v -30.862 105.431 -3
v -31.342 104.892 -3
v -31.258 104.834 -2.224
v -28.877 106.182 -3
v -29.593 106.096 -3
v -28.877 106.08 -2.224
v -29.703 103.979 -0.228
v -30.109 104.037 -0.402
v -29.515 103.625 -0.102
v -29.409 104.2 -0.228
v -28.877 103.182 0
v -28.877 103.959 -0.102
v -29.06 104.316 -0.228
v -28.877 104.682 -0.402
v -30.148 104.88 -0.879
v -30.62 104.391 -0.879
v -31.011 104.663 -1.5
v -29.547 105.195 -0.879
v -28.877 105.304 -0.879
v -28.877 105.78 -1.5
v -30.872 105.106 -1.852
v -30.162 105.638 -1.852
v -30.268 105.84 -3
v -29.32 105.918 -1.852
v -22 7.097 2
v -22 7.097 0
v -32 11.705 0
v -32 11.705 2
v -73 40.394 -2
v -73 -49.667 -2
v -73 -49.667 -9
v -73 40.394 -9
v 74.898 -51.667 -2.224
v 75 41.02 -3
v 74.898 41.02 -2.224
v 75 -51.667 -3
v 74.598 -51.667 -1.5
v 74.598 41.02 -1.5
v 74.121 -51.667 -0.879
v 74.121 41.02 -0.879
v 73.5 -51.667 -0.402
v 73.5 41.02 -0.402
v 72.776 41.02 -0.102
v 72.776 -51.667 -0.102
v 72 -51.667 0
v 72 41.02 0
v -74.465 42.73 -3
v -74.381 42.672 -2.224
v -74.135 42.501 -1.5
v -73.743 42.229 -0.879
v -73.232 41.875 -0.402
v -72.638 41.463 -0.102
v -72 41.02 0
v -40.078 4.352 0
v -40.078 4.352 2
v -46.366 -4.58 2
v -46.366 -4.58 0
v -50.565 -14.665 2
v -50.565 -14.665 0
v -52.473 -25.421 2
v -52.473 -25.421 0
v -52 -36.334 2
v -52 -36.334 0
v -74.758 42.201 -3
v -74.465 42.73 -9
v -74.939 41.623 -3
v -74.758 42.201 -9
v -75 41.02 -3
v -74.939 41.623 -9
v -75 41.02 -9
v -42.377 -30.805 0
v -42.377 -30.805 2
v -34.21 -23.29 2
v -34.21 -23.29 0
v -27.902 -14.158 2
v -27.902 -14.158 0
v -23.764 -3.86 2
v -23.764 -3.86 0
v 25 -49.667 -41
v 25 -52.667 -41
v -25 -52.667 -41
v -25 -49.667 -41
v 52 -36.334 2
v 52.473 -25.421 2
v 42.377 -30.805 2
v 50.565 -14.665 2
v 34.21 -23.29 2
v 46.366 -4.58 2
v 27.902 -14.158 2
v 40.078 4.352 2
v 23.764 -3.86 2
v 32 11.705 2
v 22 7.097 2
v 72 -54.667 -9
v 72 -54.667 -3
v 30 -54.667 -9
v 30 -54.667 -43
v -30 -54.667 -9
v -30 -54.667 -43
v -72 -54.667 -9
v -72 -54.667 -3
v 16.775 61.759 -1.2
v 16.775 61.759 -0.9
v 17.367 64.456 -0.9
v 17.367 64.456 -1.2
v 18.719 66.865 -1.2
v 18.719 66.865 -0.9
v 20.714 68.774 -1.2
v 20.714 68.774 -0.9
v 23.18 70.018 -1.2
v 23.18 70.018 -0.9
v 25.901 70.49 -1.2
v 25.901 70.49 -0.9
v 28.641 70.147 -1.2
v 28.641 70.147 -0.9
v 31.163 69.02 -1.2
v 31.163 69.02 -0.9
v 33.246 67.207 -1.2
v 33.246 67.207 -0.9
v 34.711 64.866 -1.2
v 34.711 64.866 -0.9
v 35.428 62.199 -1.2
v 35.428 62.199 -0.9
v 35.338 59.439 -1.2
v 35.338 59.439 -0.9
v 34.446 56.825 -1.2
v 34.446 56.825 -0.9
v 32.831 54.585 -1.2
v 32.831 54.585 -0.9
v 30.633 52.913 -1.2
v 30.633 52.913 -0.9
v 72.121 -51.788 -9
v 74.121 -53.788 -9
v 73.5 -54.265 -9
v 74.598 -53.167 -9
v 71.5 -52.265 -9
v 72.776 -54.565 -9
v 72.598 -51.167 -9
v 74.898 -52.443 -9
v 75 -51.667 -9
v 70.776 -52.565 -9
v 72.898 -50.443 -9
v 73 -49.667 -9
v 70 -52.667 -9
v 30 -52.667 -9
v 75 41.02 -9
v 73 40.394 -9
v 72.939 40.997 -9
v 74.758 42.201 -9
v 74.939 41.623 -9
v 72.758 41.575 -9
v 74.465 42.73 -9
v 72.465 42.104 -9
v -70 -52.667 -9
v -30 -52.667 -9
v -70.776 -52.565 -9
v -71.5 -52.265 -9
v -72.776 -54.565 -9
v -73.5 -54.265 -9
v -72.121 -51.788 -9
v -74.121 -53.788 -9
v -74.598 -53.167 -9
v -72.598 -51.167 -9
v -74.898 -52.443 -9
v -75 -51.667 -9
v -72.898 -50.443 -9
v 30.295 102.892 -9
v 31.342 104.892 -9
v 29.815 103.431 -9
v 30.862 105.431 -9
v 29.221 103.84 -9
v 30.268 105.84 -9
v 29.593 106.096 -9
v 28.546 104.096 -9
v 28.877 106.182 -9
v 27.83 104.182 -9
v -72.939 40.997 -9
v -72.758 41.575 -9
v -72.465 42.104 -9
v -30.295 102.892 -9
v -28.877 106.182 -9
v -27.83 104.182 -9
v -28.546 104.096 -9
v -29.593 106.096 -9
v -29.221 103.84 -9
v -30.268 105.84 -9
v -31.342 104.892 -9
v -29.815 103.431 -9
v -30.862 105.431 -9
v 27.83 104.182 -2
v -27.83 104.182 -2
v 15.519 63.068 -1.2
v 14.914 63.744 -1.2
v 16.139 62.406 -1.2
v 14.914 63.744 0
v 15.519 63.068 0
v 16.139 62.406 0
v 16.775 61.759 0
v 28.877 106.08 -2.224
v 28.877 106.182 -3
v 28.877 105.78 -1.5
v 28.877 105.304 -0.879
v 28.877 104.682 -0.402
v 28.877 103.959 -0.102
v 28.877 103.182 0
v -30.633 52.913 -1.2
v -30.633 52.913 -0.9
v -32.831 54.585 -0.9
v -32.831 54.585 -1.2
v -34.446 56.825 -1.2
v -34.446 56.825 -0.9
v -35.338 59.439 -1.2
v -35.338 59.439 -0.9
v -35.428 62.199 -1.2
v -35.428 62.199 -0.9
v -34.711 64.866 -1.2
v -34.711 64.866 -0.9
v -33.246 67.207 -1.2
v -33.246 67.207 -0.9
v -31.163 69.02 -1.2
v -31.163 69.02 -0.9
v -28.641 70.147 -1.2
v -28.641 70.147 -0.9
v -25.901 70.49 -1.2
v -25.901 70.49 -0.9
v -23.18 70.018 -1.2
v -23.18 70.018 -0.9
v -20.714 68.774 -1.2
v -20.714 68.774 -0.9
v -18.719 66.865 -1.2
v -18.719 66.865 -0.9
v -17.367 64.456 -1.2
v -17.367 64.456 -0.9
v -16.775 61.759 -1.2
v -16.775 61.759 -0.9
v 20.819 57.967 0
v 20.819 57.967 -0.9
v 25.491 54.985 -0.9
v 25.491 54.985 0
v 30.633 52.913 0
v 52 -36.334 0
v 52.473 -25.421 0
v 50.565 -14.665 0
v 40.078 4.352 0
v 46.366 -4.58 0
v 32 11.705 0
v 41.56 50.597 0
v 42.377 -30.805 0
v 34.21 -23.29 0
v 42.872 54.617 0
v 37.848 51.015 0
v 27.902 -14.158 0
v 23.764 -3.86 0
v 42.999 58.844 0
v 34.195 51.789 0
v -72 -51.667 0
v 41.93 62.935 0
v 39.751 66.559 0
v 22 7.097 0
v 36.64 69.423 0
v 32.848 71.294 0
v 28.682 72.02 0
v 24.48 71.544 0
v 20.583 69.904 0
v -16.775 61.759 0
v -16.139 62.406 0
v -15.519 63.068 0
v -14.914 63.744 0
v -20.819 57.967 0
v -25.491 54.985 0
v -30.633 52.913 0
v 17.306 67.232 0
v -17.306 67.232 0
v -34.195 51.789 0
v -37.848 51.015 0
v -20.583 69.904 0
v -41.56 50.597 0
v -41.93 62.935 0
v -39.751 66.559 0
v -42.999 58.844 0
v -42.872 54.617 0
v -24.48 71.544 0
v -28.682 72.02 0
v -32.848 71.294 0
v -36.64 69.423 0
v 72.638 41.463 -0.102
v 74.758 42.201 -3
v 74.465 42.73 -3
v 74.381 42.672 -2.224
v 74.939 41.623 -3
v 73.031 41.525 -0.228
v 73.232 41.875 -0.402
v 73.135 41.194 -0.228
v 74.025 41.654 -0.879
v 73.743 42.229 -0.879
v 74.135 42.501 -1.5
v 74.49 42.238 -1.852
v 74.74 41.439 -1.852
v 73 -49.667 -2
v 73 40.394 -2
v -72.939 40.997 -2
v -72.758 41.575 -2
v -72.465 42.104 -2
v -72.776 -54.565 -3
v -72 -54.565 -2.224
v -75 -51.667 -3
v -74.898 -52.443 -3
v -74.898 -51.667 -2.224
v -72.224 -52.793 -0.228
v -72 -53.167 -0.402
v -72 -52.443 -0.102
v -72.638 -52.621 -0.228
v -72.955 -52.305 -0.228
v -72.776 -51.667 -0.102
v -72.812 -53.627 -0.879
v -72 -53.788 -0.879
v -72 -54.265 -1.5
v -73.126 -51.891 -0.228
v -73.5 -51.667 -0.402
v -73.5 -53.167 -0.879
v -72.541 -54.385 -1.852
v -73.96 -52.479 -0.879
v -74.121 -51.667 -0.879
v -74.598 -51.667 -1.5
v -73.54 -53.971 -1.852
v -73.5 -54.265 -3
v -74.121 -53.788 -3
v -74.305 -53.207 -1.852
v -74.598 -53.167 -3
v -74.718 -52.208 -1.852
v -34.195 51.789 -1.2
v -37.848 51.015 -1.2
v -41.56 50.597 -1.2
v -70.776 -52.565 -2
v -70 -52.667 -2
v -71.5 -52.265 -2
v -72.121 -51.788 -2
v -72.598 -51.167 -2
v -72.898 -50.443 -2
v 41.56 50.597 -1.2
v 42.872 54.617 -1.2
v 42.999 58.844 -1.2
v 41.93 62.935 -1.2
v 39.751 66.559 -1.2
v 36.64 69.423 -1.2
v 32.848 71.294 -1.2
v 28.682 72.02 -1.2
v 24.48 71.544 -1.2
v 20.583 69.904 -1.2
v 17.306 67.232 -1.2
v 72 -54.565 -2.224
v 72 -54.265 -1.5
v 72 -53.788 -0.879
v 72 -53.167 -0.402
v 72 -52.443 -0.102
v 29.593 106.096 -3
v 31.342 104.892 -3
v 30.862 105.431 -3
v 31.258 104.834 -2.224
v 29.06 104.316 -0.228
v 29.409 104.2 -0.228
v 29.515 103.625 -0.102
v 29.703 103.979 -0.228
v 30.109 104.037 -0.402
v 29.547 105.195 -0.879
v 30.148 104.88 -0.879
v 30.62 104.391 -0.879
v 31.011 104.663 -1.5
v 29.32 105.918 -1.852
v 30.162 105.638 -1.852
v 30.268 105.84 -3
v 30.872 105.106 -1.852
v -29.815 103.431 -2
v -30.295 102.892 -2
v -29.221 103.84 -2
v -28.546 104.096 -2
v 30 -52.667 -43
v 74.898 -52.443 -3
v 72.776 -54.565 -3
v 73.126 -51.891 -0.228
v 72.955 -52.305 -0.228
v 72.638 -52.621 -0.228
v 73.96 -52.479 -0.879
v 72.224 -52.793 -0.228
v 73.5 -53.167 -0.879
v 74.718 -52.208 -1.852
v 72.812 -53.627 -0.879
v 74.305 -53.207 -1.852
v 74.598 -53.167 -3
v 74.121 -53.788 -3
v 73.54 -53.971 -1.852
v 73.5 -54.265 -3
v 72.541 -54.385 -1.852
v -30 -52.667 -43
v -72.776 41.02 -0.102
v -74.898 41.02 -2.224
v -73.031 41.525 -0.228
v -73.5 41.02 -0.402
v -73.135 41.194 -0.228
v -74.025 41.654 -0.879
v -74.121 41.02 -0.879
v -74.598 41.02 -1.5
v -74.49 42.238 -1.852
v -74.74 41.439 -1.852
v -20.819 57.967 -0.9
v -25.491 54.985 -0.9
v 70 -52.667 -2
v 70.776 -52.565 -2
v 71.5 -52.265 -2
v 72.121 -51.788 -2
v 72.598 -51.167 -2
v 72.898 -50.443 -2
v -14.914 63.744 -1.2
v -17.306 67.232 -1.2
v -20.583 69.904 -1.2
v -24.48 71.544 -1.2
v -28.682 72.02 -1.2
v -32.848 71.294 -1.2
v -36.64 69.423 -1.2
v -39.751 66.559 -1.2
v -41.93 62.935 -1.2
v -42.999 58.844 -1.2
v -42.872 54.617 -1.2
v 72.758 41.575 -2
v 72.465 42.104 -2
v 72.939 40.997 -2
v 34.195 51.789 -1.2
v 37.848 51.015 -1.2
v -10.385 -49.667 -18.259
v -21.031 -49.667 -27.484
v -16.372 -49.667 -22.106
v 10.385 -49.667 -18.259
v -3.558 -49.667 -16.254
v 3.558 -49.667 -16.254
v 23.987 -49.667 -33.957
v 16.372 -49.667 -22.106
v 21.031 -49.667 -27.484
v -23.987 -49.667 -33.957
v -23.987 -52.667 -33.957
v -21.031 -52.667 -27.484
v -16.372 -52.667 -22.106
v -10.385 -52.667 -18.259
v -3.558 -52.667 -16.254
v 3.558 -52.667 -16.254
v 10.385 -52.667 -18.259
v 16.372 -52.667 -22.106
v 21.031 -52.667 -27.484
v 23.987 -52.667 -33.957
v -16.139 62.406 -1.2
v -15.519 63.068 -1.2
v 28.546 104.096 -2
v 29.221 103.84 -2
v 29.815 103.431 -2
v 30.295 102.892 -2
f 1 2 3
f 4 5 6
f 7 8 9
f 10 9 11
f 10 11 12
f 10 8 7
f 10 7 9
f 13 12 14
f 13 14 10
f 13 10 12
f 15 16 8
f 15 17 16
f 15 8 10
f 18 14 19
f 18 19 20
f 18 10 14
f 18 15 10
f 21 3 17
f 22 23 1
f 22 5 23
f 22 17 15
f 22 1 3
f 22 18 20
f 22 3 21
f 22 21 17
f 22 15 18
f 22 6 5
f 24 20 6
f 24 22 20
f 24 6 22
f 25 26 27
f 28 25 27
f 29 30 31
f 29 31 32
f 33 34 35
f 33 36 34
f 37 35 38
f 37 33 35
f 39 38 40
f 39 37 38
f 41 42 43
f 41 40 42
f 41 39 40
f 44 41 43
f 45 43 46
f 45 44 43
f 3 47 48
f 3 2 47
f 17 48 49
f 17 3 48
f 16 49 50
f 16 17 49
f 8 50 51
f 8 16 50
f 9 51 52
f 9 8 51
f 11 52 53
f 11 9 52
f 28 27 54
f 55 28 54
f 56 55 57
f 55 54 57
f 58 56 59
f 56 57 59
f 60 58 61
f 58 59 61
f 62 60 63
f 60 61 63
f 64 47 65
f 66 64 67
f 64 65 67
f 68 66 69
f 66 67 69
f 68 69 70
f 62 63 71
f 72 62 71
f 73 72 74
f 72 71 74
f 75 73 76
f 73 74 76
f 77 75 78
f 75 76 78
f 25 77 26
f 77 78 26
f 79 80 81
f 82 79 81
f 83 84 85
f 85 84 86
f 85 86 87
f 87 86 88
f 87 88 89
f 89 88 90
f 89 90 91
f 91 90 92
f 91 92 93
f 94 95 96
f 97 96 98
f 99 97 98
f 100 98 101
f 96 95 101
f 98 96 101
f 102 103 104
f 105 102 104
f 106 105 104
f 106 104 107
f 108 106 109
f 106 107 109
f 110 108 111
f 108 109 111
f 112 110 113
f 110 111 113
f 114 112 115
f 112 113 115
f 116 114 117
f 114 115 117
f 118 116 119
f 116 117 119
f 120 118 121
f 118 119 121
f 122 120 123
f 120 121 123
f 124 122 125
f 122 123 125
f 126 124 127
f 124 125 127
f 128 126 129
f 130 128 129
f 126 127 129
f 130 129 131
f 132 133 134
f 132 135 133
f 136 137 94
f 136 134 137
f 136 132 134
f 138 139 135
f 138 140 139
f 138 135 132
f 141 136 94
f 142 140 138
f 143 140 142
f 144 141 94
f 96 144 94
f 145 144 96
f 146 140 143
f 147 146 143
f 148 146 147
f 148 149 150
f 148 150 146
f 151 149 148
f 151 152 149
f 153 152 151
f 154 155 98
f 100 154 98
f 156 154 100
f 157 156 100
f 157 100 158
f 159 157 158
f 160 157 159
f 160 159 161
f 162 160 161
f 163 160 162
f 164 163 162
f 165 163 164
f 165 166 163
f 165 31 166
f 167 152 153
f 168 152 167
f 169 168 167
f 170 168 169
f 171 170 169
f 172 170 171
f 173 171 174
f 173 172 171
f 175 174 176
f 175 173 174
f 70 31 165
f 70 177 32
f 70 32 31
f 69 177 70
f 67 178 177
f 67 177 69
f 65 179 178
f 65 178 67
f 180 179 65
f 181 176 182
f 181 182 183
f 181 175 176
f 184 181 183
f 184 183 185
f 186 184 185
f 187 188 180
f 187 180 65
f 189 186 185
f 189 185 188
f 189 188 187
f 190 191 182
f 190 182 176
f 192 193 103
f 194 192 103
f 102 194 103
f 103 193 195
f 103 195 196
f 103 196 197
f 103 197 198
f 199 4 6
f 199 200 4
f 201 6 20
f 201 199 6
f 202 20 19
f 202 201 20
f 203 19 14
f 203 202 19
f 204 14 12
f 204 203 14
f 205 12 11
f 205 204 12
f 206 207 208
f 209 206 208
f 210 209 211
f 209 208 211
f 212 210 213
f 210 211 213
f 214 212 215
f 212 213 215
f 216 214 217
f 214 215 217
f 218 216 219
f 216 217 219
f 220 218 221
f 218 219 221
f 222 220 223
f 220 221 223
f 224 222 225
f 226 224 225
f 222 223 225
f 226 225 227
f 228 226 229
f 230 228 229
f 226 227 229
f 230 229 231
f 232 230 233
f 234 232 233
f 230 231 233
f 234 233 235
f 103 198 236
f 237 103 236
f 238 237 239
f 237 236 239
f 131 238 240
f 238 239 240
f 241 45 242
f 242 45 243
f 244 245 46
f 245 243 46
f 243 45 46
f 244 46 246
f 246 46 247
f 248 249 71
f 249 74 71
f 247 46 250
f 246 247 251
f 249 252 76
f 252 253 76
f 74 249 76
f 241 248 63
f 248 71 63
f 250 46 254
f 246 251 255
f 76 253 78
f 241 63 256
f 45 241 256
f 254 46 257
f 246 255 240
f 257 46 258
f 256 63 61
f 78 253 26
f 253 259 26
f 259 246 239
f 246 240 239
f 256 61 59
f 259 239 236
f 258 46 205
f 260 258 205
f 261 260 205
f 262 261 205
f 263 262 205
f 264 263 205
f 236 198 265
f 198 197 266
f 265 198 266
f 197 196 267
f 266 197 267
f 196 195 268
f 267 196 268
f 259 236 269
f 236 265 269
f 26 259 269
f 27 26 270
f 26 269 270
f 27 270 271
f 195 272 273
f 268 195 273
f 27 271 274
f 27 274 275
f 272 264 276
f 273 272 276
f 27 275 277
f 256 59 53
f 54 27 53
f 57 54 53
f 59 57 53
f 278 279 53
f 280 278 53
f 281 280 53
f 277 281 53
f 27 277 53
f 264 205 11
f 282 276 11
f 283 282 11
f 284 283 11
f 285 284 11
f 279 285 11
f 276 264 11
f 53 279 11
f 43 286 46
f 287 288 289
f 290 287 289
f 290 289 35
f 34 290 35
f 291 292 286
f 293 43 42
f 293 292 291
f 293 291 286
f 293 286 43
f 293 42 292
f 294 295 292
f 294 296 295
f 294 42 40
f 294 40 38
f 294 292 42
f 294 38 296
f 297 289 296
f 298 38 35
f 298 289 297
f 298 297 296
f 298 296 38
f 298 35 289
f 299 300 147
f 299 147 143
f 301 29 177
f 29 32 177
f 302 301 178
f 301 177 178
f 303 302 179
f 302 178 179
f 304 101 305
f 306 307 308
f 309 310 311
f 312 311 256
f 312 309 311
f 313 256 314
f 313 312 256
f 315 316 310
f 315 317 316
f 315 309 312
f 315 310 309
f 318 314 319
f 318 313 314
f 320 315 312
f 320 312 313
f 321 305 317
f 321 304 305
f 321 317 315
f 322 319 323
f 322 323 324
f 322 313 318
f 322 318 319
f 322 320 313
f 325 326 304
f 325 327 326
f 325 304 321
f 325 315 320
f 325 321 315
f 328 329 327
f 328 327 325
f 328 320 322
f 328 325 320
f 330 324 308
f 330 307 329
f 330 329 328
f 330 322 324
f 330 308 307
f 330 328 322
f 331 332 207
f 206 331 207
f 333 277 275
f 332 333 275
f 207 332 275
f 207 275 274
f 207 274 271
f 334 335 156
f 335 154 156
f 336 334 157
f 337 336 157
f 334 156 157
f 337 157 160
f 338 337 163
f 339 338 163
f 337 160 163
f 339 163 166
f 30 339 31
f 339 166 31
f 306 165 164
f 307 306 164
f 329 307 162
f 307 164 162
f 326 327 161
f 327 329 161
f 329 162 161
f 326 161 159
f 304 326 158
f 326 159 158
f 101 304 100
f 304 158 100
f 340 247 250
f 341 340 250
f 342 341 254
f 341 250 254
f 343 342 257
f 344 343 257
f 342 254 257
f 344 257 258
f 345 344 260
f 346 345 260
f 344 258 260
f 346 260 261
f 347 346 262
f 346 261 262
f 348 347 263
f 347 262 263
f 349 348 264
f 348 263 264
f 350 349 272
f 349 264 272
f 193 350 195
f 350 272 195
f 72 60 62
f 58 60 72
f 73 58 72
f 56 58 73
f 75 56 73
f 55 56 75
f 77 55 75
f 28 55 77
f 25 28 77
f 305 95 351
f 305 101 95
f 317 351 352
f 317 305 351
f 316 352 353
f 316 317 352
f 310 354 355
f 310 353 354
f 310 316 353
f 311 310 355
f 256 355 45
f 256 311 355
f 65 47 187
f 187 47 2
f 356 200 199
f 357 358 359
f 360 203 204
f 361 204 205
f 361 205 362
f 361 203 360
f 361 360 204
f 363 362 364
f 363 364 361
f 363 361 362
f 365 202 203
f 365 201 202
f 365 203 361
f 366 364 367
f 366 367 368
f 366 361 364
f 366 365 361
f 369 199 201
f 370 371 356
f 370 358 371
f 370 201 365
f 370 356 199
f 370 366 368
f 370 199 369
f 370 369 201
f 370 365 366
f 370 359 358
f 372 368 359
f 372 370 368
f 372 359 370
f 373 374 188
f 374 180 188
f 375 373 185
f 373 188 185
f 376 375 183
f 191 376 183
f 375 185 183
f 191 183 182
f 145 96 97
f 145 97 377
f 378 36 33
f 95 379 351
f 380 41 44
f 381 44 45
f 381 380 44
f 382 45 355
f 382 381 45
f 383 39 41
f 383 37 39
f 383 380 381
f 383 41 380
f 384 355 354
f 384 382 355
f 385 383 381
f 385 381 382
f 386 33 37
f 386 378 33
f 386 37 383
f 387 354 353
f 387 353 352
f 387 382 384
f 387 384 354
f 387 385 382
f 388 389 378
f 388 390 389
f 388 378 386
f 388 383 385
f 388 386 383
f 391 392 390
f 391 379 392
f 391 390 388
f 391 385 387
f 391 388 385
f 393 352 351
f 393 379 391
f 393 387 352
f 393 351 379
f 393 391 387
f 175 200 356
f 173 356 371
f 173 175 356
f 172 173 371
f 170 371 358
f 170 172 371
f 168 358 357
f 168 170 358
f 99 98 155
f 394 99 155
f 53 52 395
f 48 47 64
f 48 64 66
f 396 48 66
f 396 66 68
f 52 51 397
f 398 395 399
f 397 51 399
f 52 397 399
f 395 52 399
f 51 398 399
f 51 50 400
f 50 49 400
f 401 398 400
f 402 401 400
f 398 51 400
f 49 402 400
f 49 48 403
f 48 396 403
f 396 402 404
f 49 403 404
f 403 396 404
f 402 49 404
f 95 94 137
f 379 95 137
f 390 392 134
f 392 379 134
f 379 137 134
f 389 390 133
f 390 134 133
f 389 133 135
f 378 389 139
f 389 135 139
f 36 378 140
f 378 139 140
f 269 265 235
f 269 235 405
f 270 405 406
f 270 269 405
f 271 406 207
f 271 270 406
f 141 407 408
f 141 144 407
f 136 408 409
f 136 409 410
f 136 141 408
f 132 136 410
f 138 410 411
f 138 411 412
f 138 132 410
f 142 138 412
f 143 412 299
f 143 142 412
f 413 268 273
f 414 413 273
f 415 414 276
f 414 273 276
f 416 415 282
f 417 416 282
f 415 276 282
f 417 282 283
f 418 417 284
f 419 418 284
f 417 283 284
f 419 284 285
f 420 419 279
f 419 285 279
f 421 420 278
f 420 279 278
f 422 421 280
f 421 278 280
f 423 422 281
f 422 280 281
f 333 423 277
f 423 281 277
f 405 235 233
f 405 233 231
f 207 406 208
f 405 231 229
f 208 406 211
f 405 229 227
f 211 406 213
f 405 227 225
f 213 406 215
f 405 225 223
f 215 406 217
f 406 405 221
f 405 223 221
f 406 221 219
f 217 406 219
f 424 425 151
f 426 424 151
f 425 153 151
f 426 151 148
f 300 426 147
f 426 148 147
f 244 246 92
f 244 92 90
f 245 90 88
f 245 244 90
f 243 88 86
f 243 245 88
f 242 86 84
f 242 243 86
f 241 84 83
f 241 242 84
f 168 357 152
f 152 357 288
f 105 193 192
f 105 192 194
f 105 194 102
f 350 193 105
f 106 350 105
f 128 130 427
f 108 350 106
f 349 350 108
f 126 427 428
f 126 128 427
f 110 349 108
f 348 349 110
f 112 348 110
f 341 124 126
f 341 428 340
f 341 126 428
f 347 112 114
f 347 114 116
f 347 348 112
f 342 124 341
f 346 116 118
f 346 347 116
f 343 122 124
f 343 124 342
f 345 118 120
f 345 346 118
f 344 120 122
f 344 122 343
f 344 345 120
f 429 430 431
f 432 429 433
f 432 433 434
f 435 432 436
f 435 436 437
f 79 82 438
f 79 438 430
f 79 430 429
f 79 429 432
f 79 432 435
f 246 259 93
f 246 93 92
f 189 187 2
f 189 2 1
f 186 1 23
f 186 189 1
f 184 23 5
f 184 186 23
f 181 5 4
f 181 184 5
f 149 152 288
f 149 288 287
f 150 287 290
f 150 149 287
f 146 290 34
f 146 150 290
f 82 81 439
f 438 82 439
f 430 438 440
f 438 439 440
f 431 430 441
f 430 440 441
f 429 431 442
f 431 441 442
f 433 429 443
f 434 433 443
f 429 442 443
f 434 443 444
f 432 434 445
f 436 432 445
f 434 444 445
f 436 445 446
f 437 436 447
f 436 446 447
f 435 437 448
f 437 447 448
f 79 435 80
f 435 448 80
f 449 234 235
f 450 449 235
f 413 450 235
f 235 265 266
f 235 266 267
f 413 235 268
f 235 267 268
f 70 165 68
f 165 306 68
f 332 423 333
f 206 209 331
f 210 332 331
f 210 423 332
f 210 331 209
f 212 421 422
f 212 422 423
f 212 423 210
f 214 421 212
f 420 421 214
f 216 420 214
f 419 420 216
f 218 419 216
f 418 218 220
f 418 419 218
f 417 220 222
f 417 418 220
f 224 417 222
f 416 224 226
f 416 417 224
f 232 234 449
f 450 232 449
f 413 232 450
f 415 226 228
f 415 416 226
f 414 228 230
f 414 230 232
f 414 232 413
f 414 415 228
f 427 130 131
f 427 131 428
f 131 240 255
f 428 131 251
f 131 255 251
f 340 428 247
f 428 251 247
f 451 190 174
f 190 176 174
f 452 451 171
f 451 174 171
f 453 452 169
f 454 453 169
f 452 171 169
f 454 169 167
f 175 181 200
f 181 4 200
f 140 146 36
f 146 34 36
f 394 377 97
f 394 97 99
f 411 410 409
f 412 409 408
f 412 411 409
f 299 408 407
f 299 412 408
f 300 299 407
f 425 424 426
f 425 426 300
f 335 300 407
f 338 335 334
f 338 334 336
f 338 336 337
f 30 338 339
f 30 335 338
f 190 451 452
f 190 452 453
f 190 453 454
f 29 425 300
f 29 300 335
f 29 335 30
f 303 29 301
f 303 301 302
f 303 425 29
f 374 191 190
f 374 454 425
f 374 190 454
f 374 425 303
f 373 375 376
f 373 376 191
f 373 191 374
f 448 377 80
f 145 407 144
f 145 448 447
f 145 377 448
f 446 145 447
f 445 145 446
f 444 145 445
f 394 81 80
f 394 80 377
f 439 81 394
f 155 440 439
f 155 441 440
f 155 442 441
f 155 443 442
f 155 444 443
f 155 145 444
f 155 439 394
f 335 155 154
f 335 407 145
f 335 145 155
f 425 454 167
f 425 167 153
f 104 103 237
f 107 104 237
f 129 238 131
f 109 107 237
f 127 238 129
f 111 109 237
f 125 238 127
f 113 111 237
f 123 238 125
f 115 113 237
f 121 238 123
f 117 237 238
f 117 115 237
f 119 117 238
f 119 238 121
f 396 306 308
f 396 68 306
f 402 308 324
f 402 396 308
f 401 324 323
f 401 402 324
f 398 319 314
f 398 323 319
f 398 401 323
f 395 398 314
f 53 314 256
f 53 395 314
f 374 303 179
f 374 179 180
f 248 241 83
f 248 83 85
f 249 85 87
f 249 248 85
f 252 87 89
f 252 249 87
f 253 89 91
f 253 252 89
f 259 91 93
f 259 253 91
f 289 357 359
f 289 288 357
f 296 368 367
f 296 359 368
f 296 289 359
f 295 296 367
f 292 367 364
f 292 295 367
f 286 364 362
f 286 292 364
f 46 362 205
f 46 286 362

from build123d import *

# Parameters (mm, degrees)
BOSS_EXTRU_1_DEPTH      = 9
BOSS_EXTRU_2_DEPTH      = 2
CONG_1_R                = 3
CONG_2_R                = 3
ENL_V_MAT_EXTRU_2_DEPTH = 1.2
ENL_V_MAT_EXTRU_3_DEPTH = 0.9
BOSS_EXTRU_3_DEPTH      = 2
ESQUISSE9_W             = 60
ESQUISSE9_H             = 2
BOSS_EXTRU_4_DEPTH      = 34
BOSS_EXTRU_5_DEPTH      = 3


with BuildPart() as part:
    # Esquisse1 → Boss.-Extru.1 (new body)
    with BuildSketch(Plane.XY):
        Polygon((-75, 41.958994513), (-30.446686156, 106.182331026), (30.446686156, 106.182331026), (75, 41.958994513), (75, -54.666809259), (-75, -54.666809259), align=None)
        Polygon((73, -52.666809259), (-73, -52.666809259), (-73, 41.333190741), (-29.4, 104.182331026), (29.4, 104.182331026), (73, 41.333190741), align=None, mode=Mode.SUBTRACT)
    extrude(amount=-BOSS_EXTRU_1_DEPTH)

    # Esquisse2 → Boss.-Extru.2 (add)
    with BuildSketch(Plane.XY):
        Polygon((-73, 41.333190741), (-29.4, 104.182331026), (29.4, 104.182331026), (73, 41.333190741), (73, -52.666809259), (-73, -52.666809259), align=None)
    extrude(amount=-BOSS_EXTRU_2_DEPTH)

    # Congé1
    cong_1_edges = [part.edges().sort_by_distance(p)[0] for p in [
        (29.4, 104.182331026, -5.5),
        (73, 41.333190741, -5.5),
        (73, -52.666809259, -5.5),
        (-73, -52.666809259, -5.5),
        (-73, 41.333190741, -5.5),
        (-29.4, 104.182331026, -5.5),
    ]]
    fillet(cong_1_edges, radius=CONG_1_R)

    # Congé2
    cong_2_edges = [part.edges().sort_by_distance(p)[0] for p in [
        (-75, 41.958994513, -4.5),
        (-30.446686156, 106.182331026, -4.5),
        (30.446686156, 106.182331026, -4.5),
        (75, 41.958994513, -4.5),
        (75, -54.666809259, -4.5),
        (-75, -54.666809259, -4.5),
        (-52.723343078, 74.07066277, 0),
        (0, 106.182331026, 0),
        (52.723343078, 74.07066277, 0),
        (75, -6.353907373, 0),
        (0, -54.666809259, 0),
        (-75, -6.353907373, 0),
    ]]
    fillet(cong_2_edges, radius=CONG_2_R)

    # Esquisse3 → Enlèv. mat.-Extru.2 (cut)
    with BuildSketch(Plane.XY):
        with BuildLine():
            ThreePointArc((14.913911185, 63.744265219), (15.827091675, 62.73511926), (16.775234523, 61.75874878))
            ThreePointArc((16.775234523, 61.75874878), (31.162887196, 69.020353616), (30.632630303, 52.91276901))
            ThreePointArc((30.632630303, 52.91276901), (36.012189208, 51.35807643), (41.559939675, 50.597032557))
            ThreePointArc((41.559939675, 50.597032557), (34.810541761, 70.493663133), (14.913911185, 63.744265219))
        make_face()
        with BuildLine():
            ThreePointArc((-16.775234523, 61.75874878), (-15.827091675, 62.73511926), (-14.913911185, 63.744265219))
            ThreePointArc((-14.913911185, 63.744265219), (-34.810541761, 70.493663133), (-41.559939675, 50.597032557))
            ThreePointArc((-41.559939675, 50.597032557), (-36.012189208, 51.35807643), (-30.632630303, 52.91276901))
            ThreePointArc((-30.632630303, 52.91276901), (-31.162887196, 69.020353616), (-16.775234523, 61.75874878))
        make_face()
    extrude(amount=-ENL_V_MAT_EXTRU_2_DEPTH, mode=Mode.SUBTRACT)

    # Esquisse7 → Enlèv. mat.-Extru.3 (cut)
    with BuildSketch(Plane.XY):
        with BuildLine():
            ThreePointArc((-30.632630303, 52.91276901), (-31.162887196, 69.020353616), (-16.775234523, 61.75874878))
            ThreePointArc((-16.775234523, 61.75874878), (-23.08615551, 56.36799961), (-30.632630303, 52.91276901))
        make_face()
        with BuildLine():
            ThreePointArc((30.632630303, 52.91276901), (31.16562065, 69.024635625), (16.775234523, 61.75874878))
            ThreePointArc((16.775234523, 61.75874878), (23.08615551, 56.36799961), (30.632630303, 52.91276901))
        make_face()
    extrude(amount=-ENL_V_MAT_EXTRU_3_DEPTH, mode=Mode.SUBTRACT)

    # Esquisse8 → Boss.-Extru.3 (add)
    with BuildSketch(Plane.XY):
        with BuildLine():
            Line((-22, 7.097367508), (-32, 11.705065554))
            ThreePointArc((-32, 11.705065554), (-48.741759908, -9.507732006), (-52, -36.334084286))
            ThreePointArc((-52, -36.334084286), (-30.801710364, -18.899787662), (-22, 7.097367508))
        make_face()
        with BuildLine():
            Line((22, 7.097367508), (32, 11.705065554))
            ThreePointArc((32, 11.705065554), (48.741759908, -9.507732006), (52, -36.334084286))
            ThreePointArc((52, -36.334084286), (30.801710364, -18.899787662), (22, 7.097367508))
        make_face()
    extrude(amount=BOSS_EXTRU_3_DEPTH)

    # Esquisse9 → Boss.-Extru.4 (add)
    with BuildSketch(Plane(origin=(0, 0, -9), x_dir=(-1, 0, 0), z_dir=(0, 0, -1))):
        with Locations((0, -53.666809259)):
            Rectangle(ESQUISSE9_W, ESQUISSE9_H)
    extrude(amount=BOSS_EXTRU_4_DEPTH)

    # Esquisse10 → Boss.-Extru.5 (add)
    with BuildSketch(Plane(origin=(0, -52.666809259, 0), x_dir=(1, 0, 0), z_dir=(0, 1, 0))):
        with BuildLine():
            Line((25, 41), (-25, 41))
            ThreePointArc((-25, 41), (0, 16), (25, 41))
        make_face()
    extrude(amount=BOSS_EXTRU_5_DEPTH)


solid = part.part
